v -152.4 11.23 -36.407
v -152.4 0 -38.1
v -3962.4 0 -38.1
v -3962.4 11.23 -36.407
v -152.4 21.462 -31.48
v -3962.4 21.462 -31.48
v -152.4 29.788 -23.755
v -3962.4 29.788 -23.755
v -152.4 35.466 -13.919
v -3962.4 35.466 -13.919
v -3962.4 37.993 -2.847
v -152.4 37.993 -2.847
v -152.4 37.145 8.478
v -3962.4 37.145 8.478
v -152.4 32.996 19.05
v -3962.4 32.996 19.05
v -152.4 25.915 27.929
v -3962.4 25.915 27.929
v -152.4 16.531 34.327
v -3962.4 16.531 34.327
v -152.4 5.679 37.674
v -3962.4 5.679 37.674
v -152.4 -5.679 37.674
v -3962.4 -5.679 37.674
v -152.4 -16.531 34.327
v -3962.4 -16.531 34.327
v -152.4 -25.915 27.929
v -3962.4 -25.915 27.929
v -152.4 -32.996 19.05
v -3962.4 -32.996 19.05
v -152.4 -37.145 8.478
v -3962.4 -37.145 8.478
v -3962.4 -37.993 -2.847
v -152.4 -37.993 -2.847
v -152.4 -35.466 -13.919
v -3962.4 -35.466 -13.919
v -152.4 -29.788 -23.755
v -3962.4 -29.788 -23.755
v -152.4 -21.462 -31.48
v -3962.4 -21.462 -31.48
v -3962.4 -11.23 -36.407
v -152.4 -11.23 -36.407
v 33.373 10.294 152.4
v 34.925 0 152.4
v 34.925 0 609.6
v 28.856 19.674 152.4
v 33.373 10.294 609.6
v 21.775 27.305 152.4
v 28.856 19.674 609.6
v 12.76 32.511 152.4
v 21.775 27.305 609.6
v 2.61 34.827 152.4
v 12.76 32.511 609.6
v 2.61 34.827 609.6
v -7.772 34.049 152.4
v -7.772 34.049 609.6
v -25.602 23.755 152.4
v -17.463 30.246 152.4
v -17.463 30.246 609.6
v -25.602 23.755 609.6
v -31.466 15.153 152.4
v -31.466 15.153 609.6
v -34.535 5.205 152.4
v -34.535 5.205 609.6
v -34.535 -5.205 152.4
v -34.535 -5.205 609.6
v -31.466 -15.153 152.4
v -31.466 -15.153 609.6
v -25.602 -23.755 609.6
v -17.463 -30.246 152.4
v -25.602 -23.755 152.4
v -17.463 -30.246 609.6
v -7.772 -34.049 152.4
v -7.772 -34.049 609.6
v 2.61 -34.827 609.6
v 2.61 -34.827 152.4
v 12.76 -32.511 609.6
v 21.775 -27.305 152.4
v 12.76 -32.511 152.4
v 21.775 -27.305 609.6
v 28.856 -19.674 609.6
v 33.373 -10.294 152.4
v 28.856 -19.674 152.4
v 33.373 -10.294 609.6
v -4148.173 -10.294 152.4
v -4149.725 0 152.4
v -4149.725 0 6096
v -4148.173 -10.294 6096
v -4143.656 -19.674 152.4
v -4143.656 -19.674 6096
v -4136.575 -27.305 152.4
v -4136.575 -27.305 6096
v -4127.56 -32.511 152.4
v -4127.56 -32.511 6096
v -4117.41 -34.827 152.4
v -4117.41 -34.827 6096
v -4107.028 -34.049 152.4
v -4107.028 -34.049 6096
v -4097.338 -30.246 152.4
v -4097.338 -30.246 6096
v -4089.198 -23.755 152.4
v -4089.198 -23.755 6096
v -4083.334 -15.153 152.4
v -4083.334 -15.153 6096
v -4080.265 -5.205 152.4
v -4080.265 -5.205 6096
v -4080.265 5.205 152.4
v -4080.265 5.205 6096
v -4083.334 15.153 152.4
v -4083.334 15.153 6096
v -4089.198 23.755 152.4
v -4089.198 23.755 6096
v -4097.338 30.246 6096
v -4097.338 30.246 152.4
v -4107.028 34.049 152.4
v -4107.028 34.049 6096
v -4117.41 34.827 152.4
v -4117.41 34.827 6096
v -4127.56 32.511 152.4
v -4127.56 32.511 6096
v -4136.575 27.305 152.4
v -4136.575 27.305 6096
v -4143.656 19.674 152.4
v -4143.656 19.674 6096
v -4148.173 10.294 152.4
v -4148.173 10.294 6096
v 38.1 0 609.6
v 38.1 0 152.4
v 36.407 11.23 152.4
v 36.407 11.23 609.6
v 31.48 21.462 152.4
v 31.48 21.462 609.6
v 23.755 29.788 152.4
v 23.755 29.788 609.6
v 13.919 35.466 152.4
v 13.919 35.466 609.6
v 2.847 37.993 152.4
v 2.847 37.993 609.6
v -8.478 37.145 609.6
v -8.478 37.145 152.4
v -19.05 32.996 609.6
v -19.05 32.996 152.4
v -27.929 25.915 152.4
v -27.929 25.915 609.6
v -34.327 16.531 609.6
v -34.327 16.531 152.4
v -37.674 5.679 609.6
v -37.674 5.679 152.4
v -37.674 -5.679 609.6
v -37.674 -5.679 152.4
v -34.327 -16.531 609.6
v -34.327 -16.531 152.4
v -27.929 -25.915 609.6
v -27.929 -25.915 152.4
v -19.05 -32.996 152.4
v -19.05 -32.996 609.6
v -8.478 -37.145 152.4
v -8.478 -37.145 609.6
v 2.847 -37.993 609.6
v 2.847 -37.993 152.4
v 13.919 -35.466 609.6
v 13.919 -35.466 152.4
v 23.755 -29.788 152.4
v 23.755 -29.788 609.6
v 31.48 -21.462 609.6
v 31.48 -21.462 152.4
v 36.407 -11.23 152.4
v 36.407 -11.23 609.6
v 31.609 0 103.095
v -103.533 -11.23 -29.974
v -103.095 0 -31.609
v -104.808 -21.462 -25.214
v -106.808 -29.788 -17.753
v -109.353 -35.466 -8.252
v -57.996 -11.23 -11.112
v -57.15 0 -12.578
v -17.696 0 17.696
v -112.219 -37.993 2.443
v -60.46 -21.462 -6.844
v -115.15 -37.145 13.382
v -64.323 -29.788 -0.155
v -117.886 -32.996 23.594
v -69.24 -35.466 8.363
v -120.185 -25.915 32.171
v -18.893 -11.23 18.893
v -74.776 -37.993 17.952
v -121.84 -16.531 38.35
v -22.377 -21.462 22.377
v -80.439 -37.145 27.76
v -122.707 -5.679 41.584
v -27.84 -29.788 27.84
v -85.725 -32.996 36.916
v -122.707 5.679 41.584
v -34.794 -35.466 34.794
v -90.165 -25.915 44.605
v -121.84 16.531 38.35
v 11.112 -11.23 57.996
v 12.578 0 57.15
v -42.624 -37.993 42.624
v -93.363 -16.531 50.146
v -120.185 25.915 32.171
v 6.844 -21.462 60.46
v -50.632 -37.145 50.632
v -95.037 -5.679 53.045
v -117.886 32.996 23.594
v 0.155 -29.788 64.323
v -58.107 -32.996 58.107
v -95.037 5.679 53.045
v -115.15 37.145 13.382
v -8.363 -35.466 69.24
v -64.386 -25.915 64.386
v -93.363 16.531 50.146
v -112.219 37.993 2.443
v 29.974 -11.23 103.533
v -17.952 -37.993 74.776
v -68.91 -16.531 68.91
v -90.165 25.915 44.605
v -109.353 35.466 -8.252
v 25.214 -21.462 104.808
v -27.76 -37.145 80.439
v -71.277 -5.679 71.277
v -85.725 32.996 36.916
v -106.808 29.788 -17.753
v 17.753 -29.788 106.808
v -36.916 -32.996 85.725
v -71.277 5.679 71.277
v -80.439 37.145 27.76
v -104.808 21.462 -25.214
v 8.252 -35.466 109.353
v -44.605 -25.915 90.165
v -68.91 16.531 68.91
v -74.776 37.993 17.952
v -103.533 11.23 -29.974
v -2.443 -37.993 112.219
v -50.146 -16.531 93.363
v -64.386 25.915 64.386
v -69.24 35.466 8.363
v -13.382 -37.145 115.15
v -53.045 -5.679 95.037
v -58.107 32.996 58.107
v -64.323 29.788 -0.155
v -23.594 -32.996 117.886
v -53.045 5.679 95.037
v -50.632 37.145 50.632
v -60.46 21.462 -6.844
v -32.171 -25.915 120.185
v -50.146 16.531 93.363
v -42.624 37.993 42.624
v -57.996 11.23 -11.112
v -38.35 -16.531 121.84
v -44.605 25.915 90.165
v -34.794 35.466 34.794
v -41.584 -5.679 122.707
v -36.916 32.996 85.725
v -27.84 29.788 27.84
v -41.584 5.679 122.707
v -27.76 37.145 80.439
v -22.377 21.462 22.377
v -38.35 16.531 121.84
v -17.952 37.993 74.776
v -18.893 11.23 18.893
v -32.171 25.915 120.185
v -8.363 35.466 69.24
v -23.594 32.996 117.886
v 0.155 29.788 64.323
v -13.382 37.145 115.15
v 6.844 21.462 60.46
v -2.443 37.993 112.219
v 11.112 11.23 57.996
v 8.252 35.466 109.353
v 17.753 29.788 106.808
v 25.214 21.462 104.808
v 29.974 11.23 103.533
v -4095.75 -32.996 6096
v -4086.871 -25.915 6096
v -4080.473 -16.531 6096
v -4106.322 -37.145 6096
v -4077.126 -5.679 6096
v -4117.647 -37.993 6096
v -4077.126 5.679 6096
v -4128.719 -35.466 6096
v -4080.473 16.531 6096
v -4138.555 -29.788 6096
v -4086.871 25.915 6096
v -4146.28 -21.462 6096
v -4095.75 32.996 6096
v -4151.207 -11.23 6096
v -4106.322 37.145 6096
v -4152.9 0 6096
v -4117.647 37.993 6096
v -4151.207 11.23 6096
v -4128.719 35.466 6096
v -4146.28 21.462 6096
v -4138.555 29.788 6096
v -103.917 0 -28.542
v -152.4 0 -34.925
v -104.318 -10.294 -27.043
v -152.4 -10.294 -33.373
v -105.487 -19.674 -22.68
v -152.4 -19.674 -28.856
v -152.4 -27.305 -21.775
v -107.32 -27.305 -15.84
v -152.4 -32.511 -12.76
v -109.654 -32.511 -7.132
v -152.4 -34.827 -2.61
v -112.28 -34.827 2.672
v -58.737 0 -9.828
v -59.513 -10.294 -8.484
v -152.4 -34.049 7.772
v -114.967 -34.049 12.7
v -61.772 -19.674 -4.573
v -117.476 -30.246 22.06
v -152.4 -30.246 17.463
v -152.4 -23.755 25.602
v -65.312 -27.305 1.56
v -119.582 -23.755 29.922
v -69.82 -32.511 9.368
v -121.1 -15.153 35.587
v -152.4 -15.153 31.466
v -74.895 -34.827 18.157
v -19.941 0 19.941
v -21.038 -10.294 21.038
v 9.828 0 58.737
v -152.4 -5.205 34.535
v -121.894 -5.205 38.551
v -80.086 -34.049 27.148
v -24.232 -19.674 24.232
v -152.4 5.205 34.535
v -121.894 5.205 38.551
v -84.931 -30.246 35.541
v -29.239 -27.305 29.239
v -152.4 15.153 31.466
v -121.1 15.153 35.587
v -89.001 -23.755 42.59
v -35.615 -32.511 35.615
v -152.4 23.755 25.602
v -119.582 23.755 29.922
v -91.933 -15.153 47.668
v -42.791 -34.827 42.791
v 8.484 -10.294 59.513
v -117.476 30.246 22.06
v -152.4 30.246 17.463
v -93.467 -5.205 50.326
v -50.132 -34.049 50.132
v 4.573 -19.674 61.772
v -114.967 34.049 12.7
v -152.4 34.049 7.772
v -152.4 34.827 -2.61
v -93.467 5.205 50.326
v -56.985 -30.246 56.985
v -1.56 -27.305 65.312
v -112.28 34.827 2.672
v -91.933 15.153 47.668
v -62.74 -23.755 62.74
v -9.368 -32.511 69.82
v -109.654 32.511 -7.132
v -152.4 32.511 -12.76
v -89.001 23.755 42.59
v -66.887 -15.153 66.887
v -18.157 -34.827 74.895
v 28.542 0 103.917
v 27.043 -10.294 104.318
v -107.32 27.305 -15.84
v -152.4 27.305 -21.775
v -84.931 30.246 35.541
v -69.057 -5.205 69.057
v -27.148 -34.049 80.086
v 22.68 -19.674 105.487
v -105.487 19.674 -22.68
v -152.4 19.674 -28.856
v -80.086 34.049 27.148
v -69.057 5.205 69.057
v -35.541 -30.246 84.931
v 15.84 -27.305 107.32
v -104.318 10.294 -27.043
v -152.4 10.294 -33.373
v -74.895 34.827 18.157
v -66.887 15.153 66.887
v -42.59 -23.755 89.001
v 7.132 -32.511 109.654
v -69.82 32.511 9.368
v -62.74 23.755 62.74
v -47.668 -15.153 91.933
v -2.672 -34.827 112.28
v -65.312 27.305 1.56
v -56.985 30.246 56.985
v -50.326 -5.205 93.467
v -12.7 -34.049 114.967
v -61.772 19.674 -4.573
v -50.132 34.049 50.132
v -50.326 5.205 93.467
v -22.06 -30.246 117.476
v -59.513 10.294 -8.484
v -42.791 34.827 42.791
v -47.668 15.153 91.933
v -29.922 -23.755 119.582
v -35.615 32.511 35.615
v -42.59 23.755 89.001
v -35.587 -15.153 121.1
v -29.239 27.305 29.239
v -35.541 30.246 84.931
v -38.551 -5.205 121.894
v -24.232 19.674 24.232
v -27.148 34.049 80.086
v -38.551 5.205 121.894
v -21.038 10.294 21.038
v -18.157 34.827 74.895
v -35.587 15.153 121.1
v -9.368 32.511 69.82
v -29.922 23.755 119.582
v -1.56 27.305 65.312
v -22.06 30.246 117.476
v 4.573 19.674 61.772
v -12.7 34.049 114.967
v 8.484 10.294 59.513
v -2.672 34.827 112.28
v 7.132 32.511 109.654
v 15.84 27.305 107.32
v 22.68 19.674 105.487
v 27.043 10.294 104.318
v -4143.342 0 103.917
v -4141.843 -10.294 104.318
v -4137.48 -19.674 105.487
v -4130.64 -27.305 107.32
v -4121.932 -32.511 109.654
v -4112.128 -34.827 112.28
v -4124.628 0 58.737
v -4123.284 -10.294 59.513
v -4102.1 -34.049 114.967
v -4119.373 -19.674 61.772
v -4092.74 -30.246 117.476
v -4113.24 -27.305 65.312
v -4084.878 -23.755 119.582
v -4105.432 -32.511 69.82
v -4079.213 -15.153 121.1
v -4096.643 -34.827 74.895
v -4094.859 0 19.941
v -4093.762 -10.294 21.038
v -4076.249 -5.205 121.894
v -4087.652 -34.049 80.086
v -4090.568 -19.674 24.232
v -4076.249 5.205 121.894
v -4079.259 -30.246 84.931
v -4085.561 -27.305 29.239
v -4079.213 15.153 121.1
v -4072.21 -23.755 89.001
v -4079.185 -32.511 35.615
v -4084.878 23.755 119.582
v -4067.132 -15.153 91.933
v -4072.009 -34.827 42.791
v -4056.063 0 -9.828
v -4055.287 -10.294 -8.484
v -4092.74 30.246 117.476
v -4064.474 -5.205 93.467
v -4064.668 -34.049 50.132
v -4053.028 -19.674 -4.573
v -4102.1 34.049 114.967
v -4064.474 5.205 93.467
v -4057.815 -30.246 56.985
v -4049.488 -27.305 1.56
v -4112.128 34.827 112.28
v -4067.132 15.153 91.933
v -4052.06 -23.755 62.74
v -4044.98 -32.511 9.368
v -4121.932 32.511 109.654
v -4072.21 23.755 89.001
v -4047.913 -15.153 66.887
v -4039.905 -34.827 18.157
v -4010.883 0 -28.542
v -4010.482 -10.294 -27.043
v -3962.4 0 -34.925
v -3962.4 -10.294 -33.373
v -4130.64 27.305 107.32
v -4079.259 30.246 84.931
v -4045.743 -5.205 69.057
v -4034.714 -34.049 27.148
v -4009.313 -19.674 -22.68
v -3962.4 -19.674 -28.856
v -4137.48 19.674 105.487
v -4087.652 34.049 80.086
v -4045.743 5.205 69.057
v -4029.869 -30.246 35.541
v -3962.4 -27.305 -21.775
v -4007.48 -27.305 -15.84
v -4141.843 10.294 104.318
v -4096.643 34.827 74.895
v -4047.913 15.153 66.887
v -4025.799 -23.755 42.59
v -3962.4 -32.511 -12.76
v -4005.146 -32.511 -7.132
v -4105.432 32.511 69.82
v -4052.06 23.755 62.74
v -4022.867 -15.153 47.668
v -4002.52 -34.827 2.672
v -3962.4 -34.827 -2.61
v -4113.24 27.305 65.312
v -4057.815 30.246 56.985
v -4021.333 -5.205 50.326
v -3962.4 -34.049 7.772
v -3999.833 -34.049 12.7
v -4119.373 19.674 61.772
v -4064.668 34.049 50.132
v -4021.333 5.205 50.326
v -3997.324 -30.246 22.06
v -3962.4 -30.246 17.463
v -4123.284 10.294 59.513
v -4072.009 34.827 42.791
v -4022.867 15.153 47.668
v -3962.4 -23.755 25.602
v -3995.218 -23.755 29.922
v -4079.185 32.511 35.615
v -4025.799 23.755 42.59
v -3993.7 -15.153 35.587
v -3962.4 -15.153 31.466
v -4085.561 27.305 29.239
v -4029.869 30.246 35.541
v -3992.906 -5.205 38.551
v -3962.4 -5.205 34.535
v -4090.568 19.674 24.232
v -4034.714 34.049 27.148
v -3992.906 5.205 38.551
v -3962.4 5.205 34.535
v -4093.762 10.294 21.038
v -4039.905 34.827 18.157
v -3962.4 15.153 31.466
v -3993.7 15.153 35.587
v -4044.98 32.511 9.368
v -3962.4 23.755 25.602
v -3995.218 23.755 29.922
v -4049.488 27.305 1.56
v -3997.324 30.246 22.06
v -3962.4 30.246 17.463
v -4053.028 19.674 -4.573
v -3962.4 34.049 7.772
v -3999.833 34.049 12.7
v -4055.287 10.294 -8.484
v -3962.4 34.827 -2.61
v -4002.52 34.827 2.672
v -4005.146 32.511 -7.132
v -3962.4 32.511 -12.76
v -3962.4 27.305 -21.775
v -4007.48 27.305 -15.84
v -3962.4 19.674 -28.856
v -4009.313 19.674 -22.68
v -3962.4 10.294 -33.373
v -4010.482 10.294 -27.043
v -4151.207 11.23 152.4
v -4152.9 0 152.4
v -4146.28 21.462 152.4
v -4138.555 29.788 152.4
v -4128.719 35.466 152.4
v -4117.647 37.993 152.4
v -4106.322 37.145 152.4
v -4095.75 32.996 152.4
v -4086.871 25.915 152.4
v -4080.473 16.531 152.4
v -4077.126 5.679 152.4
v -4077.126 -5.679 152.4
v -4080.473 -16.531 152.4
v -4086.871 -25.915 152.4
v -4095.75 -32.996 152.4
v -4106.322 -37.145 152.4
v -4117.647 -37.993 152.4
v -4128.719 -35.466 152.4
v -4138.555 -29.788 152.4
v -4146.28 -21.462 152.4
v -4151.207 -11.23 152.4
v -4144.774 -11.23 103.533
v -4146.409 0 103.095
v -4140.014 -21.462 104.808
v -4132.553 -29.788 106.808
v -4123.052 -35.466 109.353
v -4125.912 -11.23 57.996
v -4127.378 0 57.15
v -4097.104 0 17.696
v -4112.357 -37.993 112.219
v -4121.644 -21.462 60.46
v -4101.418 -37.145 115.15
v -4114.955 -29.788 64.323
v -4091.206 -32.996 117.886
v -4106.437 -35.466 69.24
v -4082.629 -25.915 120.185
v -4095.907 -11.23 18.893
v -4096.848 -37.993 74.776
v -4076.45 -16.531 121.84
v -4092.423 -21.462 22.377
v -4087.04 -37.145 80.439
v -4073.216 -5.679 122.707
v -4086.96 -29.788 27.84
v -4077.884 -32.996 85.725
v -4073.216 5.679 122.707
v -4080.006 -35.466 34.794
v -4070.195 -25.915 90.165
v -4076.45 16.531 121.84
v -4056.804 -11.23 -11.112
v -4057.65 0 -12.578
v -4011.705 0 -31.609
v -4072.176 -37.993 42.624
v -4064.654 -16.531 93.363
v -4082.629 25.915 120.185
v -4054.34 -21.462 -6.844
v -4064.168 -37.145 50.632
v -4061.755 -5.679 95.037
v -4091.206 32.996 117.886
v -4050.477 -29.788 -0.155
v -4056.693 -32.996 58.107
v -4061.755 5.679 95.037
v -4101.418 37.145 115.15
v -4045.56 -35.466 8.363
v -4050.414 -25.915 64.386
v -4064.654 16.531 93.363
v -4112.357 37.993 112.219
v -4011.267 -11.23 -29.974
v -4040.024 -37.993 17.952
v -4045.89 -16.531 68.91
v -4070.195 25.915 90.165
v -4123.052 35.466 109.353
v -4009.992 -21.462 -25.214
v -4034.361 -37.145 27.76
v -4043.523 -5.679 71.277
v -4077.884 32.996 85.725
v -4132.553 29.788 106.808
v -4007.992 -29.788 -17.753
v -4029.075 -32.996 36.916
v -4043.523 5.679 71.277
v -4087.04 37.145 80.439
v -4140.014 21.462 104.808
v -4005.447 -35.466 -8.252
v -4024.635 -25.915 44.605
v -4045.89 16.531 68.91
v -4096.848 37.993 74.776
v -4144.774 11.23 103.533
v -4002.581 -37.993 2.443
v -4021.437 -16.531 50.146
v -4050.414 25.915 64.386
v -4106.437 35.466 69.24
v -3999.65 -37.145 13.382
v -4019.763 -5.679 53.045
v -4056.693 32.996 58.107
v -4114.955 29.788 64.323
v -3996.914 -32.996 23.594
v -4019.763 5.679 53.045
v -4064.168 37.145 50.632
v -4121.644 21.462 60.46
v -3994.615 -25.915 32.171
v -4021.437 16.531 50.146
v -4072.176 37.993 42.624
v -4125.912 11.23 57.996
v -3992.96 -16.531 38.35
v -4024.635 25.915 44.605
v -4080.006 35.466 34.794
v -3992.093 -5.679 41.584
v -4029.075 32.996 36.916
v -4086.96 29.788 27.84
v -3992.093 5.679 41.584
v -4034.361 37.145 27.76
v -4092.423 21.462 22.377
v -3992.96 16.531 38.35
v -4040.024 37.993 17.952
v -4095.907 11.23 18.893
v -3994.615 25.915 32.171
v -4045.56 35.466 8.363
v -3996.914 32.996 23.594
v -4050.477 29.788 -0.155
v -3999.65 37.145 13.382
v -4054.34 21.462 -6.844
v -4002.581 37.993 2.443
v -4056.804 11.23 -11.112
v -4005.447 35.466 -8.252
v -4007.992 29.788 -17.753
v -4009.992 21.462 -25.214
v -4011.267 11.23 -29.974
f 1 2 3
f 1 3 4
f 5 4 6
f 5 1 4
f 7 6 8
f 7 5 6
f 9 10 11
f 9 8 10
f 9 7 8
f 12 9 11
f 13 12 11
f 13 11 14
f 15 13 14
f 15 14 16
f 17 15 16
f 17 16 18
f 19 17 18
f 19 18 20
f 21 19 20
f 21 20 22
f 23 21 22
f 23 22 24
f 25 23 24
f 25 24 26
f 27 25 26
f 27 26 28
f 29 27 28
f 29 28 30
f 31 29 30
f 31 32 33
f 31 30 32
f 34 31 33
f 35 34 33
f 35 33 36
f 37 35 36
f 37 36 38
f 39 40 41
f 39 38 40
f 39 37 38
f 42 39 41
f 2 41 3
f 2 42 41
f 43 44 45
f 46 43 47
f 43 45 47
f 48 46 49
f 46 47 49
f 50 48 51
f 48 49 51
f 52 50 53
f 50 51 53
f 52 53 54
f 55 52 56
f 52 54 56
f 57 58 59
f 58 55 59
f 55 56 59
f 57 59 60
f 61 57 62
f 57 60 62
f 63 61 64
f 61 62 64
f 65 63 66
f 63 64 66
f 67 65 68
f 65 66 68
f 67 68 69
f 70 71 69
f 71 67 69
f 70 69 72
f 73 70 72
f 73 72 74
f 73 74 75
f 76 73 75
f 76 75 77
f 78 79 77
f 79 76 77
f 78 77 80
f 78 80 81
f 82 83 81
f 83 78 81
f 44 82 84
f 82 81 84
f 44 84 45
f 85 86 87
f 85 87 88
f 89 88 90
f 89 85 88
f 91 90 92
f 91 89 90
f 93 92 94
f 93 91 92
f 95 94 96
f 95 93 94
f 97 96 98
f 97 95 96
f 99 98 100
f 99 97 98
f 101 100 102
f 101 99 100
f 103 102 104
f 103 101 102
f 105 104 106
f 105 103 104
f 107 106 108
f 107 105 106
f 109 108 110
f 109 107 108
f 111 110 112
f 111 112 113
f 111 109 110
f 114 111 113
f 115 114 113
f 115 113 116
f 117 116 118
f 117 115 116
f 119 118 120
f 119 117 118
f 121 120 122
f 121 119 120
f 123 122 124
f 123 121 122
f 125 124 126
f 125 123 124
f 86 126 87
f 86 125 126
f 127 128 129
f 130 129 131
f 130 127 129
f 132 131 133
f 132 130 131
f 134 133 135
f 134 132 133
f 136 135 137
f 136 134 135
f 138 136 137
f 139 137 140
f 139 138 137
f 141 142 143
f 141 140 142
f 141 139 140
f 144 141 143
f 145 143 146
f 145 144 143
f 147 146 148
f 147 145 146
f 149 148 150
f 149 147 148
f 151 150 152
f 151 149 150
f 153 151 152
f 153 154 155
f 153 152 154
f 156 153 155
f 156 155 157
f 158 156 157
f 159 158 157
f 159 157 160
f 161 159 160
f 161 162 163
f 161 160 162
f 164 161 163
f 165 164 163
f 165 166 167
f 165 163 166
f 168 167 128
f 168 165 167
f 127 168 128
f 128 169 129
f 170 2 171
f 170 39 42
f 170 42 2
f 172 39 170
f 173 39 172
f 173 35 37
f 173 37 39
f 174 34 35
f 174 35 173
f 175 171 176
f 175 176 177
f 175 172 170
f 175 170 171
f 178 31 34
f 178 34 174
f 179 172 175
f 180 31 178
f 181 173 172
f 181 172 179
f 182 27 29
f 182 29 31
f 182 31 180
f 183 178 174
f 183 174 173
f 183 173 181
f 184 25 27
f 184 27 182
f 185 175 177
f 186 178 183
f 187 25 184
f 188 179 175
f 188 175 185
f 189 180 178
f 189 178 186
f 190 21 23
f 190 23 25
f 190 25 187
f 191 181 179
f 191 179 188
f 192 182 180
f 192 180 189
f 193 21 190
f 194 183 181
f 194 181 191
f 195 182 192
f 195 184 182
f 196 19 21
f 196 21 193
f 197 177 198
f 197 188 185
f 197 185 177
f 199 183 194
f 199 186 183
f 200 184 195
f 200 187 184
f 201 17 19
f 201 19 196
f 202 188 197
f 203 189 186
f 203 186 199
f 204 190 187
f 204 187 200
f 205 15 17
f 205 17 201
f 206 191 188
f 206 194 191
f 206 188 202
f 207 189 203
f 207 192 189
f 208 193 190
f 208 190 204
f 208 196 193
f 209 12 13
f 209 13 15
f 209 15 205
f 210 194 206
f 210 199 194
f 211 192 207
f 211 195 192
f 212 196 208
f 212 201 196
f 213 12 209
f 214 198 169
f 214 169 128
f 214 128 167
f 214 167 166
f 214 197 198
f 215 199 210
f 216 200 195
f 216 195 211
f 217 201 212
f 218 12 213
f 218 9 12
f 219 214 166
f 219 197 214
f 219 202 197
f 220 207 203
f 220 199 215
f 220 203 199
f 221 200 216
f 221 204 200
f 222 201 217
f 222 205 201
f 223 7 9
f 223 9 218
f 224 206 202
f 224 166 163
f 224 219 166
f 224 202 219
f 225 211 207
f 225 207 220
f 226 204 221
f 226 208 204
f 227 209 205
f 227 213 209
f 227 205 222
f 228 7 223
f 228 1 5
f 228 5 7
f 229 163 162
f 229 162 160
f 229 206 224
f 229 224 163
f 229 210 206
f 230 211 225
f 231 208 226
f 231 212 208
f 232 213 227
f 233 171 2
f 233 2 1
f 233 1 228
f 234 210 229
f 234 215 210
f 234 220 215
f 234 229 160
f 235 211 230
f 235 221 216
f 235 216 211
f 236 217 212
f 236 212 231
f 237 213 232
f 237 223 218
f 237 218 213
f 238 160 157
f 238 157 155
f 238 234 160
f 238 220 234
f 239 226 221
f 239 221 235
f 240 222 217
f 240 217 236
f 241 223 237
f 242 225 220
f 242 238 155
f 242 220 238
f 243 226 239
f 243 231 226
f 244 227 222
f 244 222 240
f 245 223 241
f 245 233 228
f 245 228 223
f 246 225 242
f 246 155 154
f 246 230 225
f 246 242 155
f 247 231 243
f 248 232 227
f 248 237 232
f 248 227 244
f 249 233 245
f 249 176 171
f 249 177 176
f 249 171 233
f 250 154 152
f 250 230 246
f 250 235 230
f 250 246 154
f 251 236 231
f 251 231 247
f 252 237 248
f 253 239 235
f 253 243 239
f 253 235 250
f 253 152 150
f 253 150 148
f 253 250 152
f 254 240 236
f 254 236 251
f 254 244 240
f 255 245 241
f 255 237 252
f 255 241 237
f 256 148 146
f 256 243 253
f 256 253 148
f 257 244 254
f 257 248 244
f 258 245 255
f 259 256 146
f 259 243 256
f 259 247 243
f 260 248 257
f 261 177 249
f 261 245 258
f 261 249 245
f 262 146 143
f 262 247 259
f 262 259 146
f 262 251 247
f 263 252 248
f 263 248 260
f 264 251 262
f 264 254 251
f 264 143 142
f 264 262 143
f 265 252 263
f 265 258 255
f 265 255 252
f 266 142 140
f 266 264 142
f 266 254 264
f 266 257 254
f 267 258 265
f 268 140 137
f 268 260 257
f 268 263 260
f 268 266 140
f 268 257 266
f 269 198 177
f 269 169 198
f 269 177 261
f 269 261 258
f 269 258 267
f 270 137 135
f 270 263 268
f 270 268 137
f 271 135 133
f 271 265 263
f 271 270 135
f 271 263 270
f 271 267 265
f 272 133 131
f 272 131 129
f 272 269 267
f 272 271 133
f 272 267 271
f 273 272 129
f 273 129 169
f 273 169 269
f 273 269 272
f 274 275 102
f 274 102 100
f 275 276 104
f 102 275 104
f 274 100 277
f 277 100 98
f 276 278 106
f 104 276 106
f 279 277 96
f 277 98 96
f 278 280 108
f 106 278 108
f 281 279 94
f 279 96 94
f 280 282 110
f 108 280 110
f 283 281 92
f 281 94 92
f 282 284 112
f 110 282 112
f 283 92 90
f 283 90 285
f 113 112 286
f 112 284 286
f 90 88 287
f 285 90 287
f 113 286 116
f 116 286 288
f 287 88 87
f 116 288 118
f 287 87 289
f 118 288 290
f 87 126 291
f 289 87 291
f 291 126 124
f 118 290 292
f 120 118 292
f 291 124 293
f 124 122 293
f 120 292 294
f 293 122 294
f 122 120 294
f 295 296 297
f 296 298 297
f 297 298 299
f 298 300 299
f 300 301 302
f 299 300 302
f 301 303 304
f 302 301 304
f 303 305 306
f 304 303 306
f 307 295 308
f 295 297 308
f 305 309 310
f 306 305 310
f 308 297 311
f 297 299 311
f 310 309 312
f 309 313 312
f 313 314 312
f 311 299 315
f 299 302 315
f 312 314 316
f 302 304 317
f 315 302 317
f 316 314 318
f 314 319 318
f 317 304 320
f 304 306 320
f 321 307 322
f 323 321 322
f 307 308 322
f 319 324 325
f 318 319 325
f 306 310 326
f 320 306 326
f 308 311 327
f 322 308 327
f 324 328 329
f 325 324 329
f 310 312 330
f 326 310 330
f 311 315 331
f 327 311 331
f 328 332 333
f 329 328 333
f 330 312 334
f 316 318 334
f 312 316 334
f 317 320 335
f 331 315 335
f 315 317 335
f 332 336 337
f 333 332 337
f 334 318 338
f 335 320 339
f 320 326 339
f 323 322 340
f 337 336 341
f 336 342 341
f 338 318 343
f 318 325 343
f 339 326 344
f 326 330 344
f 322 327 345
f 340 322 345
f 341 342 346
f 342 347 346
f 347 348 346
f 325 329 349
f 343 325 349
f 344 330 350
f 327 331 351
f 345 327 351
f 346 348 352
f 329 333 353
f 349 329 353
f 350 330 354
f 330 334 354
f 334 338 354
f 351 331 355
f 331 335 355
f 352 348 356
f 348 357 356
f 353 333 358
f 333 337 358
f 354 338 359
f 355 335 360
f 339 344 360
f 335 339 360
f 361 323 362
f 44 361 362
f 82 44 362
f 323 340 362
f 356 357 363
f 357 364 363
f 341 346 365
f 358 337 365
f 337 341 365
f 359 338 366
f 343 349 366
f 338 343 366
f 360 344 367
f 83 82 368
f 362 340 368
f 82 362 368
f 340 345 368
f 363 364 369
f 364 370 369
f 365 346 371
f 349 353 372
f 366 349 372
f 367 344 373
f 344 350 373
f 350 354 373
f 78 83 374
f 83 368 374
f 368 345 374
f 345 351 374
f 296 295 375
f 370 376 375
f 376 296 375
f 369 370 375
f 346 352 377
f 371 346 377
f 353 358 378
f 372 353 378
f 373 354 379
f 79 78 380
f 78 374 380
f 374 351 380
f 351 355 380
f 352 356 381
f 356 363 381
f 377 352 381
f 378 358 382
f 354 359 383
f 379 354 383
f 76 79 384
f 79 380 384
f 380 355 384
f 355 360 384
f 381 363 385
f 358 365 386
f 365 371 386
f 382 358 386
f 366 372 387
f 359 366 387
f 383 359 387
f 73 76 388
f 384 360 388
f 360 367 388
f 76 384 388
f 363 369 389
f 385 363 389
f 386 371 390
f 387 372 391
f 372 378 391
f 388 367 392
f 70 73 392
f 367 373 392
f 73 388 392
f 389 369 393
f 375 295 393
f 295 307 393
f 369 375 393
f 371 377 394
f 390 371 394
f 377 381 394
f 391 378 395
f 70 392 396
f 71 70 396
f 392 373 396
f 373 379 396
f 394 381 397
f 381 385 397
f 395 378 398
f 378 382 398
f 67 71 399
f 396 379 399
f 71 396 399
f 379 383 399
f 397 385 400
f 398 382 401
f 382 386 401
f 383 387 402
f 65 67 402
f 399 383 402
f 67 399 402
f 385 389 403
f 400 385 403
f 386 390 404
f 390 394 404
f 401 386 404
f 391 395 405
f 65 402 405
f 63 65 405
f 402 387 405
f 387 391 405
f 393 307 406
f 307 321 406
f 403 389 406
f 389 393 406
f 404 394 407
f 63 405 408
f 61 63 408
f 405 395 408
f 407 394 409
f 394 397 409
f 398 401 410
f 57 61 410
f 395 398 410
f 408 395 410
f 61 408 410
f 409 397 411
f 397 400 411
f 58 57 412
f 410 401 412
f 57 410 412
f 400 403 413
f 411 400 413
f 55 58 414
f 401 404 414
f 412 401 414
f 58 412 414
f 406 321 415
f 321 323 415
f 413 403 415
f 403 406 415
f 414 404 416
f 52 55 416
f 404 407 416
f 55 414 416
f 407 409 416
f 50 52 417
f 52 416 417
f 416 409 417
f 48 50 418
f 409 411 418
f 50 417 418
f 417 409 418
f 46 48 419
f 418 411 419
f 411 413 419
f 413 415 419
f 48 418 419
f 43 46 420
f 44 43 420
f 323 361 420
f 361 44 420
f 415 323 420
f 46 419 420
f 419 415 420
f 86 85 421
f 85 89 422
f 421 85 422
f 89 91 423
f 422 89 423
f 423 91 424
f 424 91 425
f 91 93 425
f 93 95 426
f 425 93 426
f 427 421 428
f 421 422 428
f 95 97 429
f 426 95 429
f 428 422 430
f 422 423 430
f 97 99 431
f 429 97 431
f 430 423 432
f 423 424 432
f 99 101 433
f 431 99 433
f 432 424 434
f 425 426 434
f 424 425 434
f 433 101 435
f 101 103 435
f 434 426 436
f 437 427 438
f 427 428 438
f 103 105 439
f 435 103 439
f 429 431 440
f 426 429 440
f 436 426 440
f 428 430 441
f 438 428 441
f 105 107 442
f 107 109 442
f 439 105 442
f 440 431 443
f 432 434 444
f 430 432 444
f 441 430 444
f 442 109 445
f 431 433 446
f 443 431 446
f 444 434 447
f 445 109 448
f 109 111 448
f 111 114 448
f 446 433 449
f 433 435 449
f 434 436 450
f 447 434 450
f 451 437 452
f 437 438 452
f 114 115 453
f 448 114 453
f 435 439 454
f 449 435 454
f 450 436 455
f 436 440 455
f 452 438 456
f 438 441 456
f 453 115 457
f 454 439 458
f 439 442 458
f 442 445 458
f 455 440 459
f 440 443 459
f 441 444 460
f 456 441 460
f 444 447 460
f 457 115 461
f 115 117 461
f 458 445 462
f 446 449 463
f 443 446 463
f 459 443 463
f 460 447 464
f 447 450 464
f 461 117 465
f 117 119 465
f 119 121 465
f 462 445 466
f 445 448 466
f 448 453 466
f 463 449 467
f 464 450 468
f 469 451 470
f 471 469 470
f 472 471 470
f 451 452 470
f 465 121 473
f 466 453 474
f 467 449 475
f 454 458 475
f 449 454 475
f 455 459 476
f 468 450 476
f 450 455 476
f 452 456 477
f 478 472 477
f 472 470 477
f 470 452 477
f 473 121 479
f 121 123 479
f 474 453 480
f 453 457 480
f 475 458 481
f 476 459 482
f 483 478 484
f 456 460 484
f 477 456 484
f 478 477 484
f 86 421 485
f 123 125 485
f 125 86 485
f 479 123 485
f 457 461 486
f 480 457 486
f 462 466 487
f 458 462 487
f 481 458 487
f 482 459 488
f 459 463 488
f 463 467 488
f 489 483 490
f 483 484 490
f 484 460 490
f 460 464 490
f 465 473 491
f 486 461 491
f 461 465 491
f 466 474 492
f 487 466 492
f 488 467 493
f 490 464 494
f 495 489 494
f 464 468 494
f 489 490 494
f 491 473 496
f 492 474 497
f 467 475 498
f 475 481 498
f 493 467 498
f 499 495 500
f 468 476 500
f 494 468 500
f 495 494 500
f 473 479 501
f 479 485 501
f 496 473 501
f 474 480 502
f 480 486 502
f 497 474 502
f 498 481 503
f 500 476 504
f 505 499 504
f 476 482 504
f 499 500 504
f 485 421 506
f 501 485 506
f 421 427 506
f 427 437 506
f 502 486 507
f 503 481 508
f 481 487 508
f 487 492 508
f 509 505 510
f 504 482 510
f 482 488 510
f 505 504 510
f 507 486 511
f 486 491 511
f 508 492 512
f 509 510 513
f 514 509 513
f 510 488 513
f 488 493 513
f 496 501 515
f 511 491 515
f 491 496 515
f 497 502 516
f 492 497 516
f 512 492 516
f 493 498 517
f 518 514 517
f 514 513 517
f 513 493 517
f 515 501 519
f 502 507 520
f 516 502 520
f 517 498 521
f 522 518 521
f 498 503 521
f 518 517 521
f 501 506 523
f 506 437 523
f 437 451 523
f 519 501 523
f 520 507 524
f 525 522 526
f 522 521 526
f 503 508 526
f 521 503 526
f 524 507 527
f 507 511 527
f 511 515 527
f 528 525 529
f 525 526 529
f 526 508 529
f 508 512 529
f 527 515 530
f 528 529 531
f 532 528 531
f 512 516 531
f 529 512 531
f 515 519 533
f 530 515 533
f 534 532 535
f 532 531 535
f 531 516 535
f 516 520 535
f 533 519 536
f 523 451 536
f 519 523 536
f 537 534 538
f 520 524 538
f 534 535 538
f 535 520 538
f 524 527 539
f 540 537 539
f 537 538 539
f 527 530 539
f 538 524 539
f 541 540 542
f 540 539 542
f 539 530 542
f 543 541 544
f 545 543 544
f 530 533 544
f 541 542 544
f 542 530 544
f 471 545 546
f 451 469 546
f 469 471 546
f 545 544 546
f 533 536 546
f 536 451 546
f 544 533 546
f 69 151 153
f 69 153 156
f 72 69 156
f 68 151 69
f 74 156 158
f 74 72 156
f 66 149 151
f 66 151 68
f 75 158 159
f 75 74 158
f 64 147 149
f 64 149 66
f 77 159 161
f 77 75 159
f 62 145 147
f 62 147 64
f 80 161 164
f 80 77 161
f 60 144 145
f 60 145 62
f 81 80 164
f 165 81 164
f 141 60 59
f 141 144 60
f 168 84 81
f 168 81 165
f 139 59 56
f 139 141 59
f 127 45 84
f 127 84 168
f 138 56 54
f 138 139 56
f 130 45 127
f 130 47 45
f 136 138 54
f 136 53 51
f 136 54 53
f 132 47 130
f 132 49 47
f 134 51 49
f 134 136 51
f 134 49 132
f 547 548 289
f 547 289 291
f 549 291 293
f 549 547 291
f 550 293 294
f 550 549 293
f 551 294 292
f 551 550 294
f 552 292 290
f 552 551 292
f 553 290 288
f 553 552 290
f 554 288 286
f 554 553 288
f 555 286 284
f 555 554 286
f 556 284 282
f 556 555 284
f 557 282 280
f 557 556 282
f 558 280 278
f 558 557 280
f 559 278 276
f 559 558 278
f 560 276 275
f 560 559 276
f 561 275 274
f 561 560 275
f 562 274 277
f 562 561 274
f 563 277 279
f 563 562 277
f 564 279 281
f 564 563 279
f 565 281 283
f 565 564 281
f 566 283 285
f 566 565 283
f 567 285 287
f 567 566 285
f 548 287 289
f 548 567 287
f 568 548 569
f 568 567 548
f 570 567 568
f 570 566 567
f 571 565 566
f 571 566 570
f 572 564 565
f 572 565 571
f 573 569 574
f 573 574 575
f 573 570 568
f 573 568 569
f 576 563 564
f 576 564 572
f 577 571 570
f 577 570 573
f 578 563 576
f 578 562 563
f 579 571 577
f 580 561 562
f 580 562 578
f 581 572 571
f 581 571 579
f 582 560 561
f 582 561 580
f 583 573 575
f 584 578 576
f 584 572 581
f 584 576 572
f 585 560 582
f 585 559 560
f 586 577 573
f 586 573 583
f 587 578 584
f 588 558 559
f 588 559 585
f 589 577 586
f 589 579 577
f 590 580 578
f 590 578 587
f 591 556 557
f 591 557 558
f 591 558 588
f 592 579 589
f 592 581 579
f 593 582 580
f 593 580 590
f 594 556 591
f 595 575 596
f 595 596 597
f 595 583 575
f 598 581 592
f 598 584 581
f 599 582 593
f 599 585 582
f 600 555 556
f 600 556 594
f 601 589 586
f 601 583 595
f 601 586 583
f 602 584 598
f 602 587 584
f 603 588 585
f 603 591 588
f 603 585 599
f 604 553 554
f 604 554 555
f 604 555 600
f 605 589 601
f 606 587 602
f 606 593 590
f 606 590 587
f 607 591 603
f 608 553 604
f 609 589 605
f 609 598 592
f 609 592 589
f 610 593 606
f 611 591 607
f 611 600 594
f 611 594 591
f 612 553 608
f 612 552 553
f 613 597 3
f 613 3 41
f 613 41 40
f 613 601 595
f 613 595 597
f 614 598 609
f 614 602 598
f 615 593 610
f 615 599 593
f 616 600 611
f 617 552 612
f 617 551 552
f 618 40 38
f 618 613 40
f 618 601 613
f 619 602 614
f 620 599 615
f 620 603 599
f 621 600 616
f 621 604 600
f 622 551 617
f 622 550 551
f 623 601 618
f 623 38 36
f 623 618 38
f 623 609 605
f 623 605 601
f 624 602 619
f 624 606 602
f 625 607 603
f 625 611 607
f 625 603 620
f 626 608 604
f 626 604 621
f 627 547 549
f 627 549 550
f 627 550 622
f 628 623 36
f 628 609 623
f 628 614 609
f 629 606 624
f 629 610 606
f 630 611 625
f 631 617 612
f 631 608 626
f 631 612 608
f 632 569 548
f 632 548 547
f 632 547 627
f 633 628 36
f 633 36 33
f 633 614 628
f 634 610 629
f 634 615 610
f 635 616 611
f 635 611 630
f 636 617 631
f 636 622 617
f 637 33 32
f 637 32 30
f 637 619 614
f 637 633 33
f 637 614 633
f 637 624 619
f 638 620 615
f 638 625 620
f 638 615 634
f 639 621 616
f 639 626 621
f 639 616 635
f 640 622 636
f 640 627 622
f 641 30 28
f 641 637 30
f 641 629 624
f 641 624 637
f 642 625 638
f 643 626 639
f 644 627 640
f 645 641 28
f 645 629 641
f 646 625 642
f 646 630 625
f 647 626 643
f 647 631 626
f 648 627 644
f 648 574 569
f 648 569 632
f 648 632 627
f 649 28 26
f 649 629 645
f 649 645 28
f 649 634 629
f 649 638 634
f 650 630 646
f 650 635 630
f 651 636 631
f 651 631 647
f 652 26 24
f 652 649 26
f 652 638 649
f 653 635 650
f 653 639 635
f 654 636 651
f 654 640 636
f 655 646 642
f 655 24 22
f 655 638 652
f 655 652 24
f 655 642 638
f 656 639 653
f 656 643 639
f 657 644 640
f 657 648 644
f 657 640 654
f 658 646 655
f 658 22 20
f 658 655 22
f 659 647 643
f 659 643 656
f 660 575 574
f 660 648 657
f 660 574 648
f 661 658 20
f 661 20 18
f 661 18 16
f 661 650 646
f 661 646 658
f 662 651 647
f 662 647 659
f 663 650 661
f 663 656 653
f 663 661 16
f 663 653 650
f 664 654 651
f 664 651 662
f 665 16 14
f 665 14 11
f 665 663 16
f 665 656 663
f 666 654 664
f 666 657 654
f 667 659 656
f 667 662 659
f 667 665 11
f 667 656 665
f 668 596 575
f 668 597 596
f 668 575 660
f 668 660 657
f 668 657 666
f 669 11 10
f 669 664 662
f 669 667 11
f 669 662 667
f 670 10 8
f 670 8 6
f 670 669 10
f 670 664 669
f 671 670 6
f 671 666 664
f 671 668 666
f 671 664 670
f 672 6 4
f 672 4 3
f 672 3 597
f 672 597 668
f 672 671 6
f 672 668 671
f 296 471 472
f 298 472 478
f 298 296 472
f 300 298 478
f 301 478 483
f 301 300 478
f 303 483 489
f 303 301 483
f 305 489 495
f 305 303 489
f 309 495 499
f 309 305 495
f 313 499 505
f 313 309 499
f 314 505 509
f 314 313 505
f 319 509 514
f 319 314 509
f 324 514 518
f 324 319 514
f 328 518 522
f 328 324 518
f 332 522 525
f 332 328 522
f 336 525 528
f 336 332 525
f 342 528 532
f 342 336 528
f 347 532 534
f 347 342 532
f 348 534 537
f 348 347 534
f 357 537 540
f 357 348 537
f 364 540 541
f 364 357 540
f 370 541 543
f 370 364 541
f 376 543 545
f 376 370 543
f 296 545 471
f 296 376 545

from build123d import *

# Parameters (mm, degrees)
SKETCH14_R   = 38.1
SKETCH14_R_2 = 34.925


with BuildPart() as part:
    # Sweep1: sweep along a path in Sketch13
    with BuildLine(Plane(origin=(0, 0, 0), x_dir=(1, 0, 0), z_dir=(0, 1, 0))) as sweep1_path:
        Line((-4114.8, -6096), (-4114.8, -152.4))
        ThreePointArc((-4114.8, -152.4), (-4070.163073453, -44.636926547), (-3962.4, 0))
        Line((-3962.4, 0), (-152.4, 0))
        ThreePointArc((-152.4, 0), (-44.636926547, -44.636926547), (0, -152.4))
        Line((0, -152.4), (0, -609.6))
    # Sketch14 → Sweep1 (sweep)
    with BuildSketch(Plane.XY.offset(609.6)):
        Circle(SKETCH14_R)
        Circle(SKETCH14_R_2, mode=Mode.SUBTRACT)
    sweep(path=sweep1_path.line)


solid = part.part
